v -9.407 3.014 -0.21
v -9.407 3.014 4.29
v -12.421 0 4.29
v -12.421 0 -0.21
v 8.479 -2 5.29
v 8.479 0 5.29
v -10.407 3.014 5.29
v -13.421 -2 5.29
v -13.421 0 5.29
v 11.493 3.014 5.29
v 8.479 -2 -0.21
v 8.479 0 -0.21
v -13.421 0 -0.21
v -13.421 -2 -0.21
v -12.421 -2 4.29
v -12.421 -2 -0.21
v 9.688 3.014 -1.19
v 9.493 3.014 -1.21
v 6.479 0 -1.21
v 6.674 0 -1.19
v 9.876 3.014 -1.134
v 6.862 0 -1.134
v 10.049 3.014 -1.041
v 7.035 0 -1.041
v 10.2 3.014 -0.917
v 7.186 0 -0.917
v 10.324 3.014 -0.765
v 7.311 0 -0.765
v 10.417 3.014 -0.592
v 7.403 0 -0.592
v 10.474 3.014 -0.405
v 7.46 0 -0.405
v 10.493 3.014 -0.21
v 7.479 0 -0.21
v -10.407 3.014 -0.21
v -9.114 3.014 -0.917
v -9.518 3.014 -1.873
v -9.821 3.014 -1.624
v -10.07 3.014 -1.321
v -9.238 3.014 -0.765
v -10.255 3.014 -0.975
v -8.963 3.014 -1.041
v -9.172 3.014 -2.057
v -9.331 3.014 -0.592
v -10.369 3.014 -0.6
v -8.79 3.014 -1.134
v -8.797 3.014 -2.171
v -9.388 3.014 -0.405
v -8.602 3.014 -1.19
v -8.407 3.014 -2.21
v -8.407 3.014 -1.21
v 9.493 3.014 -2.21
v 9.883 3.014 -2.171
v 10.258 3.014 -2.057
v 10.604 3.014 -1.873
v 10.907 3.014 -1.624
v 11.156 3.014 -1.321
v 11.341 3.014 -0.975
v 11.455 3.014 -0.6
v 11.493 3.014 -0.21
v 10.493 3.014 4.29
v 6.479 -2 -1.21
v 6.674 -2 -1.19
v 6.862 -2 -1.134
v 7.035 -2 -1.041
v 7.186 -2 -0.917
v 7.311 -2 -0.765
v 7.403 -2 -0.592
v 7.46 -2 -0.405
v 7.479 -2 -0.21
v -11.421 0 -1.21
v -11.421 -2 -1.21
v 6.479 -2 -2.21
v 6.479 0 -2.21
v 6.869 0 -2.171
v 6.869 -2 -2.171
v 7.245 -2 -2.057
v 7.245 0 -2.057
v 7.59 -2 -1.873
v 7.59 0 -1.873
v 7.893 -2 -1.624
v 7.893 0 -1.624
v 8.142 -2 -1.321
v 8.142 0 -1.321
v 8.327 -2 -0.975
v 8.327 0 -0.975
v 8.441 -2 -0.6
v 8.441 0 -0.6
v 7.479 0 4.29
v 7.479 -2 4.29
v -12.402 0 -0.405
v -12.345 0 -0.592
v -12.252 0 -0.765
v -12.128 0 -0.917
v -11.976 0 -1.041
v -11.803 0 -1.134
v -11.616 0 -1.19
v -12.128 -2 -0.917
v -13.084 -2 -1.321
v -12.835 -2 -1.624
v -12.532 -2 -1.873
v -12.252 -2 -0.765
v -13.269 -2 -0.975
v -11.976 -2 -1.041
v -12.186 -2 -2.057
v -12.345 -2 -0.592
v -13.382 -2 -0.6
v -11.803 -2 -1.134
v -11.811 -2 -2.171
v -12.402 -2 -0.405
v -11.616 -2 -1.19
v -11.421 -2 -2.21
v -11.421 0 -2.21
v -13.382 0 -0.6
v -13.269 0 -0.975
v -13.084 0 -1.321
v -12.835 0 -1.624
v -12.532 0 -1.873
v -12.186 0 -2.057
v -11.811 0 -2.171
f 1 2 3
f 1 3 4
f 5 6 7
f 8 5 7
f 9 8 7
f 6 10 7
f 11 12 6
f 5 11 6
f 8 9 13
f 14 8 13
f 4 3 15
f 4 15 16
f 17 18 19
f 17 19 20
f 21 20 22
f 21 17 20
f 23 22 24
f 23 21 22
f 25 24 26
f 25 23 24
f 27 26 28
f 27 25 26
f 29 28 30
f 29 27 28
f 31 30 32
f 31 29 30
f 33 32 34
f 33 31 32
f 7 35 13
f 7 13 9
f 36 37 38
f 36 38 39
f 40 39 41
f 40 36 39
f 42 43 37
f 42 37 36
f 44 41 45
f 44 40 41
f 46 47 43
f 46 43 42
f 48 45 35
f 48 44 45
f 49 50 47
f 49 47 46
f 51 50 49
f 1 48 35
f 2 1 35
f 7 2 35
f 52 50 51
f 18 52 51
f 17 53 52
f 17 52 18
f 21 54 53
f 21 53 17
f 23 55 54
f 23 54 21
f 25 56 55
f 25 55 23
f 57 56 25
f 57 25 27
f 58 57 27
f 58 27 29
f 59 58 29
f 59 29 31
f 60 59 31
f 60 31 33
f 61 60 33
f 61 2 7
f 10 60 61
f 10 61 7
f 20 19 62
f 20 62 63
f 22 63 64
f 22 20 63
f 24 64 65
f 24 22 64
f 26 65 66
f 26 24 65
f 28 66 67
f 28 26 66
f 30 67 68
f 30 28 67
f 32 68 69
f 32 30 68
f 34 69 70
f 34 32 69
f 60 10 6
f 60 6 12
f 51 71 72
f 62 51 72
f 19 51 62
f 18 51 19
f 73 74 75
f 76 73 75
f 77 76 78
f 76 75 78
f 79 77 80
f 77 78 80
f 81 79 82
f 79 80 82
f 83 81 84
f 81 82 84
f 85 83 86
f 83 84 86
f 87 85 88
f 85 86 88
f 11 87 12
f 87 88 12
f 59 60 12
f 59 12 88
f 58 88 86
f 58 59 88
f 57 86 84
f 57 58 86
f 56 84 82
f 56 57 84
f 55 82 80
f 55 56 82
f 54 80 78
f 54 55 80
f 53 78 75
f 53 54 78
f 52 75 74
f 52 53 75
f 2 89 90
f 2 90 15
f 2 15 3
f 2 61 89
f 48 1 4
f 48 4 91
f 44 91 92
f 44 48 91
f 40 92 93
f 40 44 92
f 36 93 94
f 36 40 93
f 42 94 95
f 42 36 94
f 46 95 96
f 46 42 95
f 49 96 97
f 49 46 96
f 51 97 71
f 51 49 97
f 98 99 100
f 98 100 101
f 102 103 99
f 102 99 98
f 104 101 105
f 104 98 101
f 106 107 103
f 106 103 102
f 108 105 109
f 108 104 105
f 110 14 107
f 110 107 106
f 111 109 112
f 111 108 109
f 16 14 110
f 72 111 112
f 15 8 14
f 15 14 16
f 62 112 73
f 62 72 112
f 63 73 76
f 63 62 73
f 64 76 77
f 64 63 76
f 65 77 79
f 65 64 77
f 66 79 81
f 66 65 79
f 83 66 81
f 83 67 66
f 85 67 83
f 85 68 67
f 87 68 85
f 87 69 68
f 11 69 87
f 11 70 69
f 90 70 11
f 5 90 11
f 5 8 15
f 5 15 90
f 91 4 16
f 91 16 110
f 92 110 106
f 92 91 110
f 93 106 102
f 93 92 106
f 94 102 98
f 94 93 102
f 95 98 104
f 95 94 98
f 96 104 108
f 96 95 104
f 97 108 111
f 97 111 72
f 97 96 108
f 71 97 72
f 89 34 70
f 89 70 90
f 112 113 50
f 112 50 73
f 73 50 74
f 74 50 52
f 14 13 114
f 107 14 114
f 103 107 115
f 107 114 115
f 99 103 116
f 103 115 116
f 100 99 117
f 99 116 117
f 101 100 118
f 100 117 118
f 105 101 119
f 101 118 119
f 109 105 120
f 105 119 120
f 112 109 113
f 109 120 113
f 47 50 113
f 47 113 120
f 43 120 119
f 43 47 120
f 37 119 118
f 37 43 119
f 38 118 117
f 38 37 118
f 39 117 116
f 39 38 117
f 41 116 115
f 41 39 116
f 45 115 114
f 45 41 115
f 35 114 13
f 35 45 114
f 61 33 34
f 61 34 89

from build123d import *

# Parameters (mm, degrees)
EXTRUDE_2_DEPTH = 2


with BuildPart() as part:
    # По траектории1: sweep along a path in Эскиз2
    with BuildLine(Plane.XY) as sweep_1_path:
        Line((-13.420763014, 0), (-10.40702754, 3.013735474))
    # Эскиз1 → По траектории1 (sweep)
    with BuildSketch(Plane(origin=(0, 0, 0), x_dir=(1, 0, 0), z_dir=(0, 1, 0))):
        with BuildLine():
            Line((-11.420763014, 2.209655172), (6.479236986, 2.209655172))
            ThreePointArc((6.479236986, 2.209655172), (7.893450549, 1.623868735), (8.479236986, 0.209655172))
            Line((8.479236986, 0.209655172), (8.479236986, -5.290344828))
            Line((8.479236986, -5.290344828), (-13.420763014, -5.290344828))
            Line((-13.420763014, -5.290344828), (-13.420763014, 0.209655172))
            ThreePointArc((-13.420763014, 0.209655172), (-12.834976576, 1.623868735), (-11.420763014, 2.209655172))
        make_face()
        with BuildLine():
            Line((-11.420763014, 1.209655172), (6.479236986, 1.209655172))
            ThreePointArc((6.479236986, 1.209655172), (7.186343768, 0.916761954), (7.479236986, 0.209655172))
            Line((7.479236986, 0.209655172), (7.479236986, -4.290344828))
            Line((7.479236986, -4.290344828), (-12.420763014, -4.290344828))
            Line((-12.420763014, -4.290344828), (-12.420763014, 0.209655172))
            ThreePointArc((-12.420763014, 0.209655172), (-12.127869795, 0.916761954), (-11.420763014, 1.209655172))
        make_face(mode=Mode.SUBTRACT)
    sweep(path=sweep_1_path.line)

    # Эскиз3 → Бобышка-Вытянуть2 (add)
    with BuildSketch(Plane.XZ):
        with BuildLine():
            Line((8.479236986, -0.209655172), (8.479236986, 5.290344828))
            Line((8.479236986, 5.290344828), (-13.420763014, 5.290344828))
            Line((-13.420763014, 5.290344828), (-13.420763014, -0.209655172))
            ThreePointArc((-13.420763014, -0.209655172), (-12.834976576, -1.623868735), (-11.420763014, -2.209655172))
            Line((-11.420763014, -2.209655172), (6.479236986, -2.209655172))
            ThreePointArc((6.479236986, -2.209655172), (7.893450549, -1.623868735), (8.479236986, -0.209655172))
        make_face()
        with BuildLine():
            Line((7.479236986, -0.209655172), (7.479236986, 4.290344828))
            Line((7.479236986, 4.290344828), (-12.420763014, 4.290344828))
            Line((-12.420763014, 4.290344828), (-12.420763014, -0.209655172))
            ThreePointArc((-12.420763014, -0.209655172), (-12.127869795, -0.916761954), (-11.420763014, -1.209655172))
            Line((-11.420763014, -1.209655172), (6.479236986, -1.209655172))
            ThreePointArc((6.479236986, -1.209655172), (7.186343768, -0.916761954), (7.479236986, -0.209655172))
        make_face(mode=Mode.SUBTRACT)
    extrude(amount=EXTRUDE_2_DEPTH)


solid = part.part
